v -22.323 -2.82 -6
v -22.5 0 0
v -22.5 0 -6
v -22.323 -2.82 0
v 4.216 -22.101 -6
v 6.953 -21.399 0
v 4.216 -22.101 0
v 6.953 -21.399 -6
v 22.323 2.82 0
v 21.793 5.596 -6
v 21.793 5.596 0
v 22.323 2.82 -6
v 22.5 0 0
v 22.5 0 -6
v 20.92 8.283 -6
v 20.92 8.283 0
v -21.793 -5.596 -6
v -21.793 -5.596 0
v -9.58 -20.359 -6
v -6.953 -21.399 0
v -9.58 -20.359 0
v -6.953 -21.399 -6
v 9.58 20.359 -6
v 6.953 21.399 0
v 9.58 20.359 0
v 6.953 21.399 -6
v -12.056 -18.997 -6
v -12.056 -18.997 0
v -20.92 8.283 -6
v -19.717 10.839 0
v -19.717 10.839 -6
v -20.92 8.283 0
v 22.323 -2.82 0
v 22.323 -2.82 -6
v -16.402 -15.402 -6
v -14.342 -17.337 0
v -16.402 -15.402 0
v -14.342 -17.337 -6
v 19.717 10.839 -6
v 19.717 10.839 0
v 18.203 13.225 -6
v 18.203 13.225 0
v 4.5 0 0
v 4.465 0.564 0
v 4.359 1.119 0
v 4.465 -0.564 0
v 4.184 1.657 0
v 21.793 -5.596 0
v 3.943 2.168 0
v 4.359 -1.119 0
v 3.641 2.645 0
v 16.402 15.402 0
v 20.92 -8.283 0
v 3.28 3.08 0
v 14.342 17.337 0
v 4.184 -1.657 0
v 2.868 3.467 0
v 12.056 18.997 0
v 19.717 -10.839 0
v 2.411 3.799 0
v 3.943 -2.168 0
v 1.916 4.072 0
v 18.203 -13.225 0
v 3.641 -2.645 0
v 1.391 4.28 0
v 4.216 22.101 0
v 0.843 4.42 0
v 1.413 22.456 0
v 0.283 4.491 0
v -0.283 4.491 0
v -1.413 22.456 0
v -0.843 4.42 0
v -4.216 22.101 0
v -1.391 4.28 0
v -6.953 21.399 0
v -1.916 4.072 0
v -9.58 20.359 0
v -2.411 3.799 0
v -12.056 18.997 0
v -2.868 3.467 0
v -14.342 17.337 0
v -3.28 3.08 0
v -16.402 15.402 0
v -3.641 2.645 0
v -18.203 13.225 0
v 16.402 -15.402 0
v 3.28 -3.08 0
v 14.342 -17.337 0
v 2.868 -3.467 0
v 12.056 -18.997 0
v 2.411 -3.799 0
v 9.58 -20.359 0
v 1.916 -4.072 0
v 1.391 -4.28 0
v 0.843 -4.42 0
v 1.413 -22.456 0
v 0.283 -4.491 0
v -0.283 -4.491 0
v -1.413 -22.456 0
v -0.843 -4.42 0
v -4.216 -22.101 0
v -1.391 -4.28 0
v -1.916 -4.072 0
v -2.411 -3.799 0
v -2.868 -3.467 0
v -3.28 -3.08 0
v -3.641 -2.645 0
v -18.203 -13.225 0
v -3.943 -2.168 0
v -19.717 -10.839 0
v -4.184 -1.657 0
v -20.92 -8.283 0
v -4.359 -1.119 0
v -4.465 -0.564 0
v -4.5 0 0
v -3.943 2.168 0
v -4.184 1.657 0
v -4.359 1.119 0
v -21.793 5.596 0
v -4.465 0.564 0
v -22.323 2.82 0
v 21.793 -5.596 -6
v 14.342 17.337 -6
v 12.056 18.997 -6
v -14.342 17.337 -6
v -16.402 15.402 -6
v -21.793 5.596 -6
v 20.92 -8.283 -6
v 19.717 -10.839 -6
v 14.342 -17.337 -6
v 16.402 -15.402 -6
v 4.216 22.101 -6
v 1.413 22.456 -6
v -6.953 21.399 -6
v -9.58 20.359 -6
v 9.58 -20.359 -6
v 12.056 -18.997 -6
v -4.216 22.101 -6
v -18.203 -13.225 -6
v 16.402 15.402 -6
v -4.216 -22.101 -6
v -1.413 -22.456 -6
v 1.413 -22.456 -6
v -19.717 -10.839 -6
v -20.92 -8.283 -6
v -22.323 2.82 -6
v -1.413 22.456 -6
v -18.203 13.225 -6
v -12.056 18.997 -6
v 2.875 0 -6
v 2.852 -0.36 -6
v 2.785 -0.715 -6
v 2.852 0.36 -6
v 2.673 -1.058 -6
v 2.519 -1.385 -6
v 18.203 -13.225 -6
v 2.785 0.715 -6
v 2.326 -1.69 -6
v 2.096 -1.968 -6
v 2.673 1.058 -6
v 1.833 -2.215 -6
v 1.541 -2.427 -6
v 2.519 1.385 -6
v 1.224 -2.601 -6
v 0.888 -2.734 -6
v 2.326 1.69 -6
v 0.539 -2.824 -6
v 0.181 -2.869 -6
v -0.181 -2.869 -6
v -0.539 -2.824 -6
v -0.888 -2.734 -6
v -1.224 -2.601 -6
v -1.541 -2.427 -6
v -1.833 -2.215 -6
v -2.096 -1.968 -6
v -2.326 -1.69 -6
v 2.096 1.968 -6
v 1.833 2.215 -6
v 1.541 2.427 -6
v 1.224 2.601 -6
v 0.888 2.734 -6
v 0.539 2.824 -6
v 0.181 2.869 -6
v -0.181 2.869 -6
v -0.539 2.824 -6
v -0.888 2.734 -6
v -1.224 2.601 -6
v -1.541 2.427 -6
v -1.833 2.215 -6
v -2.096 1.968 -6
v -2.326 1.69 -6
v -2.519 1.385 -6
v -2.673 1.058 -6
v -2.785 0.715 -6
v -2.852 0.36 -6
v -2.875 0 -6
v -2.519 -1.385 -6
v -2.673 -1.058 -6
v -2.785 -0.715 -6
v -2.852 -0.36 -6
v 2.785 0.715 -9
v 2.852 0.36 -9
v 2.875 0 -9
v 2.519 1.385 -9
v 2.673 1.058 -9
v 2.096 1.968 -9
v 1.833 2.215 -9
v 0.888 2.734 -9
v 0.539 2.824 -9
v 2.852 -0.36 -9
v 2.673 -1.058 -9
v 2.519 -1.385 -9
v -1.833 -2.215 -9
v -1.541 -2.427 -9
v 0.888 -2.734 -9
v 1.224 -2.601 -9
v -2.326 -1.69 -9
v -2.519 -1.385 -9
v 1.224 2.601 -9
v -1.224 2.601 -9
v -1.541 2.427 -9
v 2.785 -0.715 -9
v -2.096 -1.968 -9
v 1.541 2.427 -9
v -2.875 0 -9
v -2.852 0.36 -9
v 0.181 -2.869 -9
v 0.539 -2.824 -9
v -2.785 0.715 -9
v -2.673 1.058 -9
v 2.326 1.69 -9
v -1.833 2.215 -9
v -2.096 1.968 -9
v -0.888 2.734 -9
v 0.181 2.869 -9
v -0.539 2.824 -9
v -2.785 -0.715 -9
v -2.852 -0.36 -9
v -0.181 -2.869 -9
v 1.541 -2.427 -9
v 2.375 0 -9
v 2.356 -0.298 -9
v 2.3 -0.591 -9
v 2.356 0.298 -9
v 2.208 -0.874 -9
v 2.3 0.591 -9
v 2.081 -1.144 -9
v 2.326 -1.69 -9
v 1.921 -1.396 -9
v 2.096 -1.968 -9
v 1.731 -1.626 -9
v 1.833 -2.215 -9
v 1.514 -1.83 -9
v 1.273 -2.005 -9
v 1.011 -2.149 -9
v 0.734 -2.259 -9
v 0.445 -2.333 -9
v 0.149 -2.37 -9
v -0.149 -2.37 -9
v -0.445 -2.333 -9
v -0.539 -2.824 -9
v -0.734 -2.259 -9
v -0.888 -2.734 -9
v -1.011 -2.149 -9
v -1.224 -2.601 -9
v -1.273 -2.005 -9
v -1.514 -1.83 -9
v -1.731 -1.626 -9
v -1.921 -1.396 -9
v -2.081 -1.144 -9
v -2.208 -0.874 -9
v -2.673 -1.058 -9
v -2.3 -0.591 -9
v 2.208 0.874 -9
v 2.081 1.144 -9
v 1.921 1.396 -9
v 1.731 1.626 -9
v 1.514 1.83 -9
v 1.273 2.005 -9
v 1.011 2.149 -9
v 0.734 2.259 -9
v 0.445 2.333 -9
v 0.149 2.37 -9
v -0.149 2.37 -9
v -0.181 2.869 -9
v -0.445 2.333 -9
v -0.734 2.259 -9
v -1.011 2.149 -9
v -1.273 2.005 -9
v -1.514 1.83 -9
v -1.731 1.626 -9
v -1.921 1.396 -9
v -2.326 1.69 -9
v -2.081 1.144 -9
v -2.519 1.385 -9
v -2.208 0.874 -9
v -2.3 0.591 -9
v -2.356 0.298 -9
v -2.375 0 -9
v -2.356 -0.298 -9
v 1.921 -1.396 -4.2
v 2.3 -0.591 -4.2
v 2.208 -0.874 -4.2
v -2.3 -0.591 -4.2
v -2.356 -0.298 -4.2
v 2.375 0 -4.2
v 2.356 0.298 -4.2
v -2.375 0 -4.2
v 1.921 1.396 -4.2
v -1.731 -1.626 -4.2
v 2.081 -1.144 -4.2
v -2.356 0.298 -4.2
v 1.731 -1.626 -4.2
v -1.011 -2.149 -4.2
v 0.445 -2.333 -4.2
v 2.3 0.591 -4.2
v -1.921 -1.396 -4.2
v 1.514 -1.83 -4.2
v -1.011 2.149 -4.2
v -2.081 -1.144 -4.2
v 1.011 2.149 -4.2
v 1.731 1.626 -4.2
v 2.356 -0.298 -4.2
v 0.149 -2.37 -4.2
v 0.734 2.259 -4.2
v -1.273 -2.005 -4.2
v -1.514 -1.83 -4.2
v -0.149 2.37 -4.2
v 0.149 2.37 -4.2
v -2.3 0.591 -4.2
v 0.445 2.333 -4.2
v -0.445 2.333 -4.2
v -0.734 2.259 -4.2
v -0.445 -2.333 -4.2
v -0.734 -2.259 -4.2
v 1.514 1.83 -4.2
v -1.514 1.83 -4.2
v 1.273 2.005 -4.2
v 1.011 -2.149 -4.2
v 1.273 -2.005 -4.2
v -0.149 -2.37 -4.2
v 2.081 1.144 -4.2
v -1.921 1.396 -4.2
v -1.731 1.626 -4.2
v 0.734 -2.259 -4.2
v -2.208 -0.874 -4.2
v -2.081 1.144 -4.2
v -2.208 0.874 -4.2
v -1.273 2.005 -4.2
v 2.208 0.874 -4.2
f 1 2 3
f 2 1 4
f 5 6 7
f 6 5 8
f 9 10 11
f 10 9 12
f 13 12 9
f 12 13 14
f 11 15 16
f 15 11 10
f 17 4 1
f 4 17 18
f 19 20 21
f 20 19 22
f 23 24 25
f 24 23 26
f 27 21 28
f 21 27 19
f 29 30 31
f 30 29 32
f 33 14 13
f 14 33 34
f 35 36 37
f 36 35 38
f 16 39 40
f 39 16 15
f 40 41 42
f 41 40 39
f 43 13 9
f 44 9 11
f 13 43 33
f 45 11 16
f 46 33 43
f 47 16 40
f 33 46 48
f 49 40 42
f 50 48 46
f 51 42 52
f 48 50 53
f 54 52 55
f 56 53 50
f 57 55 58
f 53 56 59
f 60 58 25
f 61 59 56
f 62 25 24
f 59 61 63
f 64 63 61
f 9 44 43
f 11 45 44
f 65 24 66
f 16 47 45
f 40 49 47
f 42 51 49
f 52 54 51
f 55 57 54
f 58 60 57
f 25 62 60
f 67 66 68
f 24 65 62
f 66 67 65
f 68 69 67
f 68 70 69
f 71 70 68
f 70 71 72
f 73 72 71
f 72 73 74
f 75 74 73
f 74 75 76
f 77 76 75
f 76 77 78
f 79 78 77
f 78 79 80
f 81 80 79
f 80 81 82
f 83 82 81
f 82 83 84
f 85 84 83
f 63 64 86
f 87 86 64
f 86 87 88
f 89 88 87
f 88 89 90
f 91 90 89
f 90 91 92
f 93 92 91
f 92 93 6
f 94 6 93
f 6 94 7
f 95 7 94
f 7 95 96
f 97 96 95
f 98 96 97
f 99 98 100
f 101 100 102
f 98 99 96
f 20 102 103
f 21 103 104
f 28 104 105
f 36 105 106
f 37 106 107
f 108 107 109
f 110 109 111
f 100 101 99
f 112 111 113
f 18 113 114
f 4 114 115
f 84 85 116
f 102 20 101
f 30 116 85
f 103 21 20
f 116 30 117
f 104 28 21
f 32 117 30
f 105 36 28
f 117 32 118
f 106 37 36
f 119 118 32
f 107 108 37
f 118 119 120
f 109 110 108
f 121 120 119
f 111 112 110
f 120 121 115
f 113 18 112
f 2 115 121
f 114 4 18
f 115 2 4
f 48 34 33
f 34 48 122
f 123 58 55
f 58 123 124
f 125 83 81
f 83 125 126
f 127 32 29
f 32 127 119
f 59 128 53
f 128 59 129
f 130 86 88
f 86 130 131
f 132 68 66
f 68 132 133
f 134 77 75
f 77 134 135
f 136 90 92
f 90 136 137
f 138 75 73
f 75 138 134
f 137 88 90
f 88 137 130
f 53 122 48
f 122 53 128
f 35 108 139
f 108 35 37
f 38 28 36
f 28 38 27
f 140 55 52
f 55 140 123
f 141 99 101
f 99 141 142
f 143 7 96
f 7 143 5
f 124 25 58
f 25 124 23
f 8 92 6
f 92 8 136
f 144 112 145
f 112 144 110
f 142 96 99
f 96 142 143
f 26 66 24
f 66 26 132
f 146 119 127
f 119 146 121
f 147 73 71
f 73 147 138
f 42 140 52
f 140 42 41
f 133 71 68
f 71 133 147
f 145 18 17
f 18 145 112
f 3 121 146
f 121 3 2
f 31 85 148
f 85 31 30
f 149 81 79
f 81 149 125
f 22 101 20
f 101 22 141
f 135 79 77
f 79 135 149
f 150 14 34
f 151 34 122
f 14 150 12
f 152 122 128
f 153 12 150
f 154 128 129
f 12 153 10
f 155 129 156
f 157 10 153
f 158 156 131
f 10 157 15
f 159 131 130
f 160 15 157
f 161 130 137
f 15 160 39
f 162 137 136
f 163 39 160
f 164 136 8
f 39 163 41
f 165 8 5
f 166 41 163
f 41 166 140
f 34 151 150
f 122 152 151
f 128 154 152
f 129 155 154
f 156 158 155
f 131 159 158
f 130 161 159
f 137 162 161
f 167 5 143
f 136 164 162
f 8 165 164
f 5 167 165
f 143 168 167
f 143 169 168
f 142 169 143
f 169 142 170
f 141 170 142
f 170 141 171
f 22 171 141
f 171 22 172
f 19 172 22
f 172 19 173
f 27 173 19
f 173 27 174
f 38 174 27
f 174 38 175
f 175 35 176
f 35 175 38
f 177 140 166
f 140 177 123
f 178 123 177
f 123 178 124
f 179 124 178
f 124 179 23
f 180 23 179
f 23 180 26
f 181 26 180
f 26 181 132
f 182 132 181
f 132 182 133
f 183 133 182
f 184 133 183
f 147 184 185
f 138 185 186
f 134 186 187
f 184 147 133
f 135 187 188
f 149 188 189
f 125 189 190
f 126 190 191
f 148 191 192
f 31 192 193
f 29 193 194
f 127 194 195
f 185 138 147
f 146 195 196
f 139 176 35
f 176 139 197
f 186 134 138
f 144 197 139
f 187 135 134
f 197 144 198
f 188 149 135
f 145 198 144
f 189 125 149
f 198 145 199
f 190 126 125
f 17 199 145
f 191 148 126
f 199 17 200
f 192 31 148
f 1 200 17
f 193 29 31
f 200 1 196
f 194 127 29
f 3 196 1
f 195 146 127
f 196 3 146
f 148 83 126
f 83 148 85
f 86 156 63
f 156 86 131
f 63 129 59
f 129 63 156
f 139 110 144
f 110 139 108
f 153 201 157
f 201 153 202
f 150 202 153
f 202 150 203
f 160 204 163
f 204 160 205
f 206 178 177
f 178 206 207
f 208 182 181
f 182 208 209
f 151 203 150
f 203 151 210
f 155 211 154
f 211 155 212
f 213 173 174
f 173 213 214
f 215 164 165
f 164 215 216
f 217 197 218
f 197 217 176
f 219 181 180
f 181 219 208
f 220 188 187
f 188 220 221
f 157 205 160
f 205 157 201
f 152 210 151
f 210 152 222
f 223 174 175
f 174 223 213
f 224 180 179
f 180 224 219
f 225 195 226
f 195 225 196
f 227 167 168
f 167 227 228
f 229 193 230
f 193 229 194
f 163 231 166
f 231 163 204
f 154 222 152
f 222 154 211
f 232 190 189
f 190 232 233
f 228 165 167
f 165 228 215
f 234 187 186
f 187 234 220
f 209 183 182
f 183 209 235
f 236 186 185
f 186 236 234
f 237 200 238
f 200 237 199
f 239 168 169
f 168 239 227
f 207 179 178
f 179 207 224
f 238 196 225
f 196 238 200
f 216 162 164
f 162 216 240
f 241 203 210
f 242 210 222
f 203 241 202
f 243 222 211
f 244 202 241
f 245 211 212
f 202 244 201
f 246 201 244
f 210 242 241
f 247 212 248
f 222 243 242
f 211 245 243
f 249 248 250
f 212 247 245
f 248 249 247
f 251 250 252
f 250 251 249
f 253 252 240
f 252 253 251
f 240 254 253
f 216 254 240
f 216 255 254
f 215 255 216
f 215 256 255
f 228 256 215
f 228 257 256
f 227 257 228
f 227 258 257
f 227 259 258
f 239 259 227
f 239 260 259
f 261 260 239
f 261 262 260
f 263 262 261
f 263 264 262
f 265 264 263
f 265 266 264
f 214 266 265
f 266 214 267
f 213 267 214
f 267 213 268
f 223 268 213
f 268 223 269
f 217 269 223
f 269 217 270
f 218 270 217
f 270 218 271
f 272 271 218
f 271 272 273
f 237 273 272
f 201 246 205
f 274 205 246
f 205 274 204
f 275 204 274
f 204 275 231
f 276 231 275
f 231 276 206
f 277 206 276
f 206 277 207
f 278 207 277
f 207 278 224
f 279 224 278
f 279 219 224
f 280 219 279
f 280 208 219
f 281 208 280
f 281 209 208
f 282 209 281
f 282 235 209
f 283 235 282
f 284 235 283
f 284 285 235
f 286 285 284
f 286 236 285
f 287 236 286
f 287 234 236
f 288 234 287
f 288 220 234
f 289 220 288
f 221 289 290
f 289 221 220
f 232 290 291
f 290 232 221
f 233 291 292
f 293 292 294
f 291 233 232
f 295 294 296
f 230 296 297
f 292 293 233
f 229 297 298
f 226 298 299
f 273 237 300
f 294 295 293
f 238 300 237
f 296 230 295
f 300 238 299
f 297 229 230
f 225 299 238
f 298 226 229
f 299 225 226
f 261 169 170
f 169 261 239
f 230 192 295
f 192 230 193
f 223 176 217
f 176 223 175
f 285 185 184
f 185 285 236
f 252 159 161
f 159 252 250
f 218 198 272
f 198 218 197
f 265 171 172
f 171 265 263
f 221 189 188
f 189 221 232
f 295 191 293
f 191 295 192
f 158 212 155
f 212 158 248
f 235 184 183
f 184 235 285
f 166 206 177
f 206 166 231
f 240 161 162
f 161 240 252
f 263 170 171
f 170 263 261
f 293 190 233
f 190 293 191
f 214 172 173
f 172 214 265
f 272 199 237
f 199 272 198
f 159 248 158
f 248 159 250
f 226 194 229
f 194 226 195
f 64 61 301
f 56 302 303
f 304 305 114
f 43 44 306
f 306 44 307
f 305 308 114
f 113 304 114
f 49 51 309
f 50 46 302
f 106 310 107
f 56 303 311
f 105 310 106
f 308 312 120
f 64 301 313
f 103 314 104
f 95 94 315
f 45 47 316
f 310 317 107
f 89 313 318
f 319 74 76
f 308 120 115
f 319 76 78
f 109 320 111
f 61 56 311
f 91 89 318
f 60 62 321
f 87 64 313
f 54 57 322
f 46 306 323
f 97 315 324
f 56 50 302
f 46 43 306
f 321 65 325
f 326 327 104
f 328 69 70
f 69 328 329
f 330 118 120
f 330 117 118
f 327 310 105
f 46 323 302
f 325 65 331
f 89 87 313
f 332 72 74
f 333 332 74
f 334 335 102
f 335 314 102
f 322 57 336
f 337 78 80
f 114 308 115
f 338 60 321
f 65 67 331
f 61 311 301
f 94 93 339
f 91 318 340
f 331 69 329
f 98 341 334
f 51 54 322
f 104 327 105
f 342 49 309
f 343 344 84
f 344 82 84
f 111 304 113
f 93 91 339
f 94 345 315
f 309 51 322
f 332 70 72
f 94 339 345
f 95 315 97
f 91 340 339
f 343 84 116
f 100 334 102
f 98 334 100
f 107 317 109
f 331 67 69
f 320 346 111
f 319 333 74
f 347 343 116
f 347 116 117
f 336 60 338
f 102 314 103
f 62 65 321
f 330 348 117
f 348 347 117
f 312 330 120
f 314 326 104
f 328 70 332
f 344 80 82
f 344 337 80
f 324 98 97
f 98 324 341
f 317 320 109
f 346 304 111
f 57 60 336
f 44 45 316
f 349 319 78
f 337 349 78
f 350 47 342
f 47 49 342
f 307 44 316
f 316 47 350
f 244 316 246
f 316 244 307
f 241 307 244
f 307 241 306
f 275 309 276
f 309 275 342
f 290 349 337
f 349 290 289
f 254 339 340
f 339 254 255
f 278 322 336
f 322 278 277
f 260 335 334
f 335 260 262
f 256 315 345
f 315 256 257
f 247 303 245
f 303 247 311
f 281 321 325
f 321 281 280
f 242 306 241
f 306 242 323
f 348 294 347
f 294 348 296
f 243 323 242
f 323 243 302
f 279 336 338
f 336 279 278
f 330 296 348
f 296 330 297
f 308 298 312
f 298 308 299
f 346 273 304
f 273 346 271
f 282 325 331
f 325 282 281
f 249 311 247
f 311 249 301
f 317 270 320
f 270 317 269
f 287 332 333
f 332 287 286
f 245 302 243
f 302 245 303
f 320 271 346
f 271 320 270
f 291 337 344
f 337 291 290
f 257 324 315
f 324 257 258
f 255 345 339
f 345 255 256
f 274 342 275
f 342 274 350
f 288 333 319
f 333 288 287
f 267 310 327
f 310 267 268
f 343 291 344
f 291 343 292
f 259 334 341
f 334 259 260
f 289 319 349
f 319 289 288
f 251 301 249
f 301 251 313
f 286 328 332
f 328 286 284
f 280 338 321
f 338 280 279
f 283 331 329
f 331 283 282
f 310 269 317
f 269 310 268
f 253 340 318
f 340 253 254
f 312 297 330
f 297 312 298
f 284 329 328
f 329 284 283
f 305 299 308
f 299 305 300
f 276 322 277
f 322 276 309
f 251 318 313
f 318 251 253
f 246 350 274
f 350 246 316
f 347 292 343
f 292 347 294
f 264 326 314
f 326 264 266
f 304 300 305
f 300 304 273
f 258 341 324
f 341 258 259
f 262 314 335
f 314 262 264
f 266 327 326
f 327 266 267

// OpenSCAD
$fn = 50;

difference() {
	union() {
		translate(v = [0, 0, -6.0]) {
			cylinder(h = 6, r = 22.5);
		}
		#translate(v = [0, 0, -9.0]) {
			cylinder(h = 9, r = 2.875);
		}
	}
	union() {
		translate(v = [0, 0, 0]) {
			rotate(a = [0, 0, 0]) {
				difference() {
					union() {
						translate(v = [0, 0, -9.0]) {
							cylinder(h = 9, r = 2.25);
						}
						translate(v = [0, 0, -4.2]) {
							cylinder(h = 4.2, r1 = 2.375, r2 = 4.5);
						}
						translate(v = [0, 0, -9.0]) {
							cylinder(h = 9, r = 2.375);
						}
						translate(v = [0, 0, -9.0]) {
							cylinder(h = 9, r = 2.25);
						}
					}
					union();
				}
			}
		}
	}
}
